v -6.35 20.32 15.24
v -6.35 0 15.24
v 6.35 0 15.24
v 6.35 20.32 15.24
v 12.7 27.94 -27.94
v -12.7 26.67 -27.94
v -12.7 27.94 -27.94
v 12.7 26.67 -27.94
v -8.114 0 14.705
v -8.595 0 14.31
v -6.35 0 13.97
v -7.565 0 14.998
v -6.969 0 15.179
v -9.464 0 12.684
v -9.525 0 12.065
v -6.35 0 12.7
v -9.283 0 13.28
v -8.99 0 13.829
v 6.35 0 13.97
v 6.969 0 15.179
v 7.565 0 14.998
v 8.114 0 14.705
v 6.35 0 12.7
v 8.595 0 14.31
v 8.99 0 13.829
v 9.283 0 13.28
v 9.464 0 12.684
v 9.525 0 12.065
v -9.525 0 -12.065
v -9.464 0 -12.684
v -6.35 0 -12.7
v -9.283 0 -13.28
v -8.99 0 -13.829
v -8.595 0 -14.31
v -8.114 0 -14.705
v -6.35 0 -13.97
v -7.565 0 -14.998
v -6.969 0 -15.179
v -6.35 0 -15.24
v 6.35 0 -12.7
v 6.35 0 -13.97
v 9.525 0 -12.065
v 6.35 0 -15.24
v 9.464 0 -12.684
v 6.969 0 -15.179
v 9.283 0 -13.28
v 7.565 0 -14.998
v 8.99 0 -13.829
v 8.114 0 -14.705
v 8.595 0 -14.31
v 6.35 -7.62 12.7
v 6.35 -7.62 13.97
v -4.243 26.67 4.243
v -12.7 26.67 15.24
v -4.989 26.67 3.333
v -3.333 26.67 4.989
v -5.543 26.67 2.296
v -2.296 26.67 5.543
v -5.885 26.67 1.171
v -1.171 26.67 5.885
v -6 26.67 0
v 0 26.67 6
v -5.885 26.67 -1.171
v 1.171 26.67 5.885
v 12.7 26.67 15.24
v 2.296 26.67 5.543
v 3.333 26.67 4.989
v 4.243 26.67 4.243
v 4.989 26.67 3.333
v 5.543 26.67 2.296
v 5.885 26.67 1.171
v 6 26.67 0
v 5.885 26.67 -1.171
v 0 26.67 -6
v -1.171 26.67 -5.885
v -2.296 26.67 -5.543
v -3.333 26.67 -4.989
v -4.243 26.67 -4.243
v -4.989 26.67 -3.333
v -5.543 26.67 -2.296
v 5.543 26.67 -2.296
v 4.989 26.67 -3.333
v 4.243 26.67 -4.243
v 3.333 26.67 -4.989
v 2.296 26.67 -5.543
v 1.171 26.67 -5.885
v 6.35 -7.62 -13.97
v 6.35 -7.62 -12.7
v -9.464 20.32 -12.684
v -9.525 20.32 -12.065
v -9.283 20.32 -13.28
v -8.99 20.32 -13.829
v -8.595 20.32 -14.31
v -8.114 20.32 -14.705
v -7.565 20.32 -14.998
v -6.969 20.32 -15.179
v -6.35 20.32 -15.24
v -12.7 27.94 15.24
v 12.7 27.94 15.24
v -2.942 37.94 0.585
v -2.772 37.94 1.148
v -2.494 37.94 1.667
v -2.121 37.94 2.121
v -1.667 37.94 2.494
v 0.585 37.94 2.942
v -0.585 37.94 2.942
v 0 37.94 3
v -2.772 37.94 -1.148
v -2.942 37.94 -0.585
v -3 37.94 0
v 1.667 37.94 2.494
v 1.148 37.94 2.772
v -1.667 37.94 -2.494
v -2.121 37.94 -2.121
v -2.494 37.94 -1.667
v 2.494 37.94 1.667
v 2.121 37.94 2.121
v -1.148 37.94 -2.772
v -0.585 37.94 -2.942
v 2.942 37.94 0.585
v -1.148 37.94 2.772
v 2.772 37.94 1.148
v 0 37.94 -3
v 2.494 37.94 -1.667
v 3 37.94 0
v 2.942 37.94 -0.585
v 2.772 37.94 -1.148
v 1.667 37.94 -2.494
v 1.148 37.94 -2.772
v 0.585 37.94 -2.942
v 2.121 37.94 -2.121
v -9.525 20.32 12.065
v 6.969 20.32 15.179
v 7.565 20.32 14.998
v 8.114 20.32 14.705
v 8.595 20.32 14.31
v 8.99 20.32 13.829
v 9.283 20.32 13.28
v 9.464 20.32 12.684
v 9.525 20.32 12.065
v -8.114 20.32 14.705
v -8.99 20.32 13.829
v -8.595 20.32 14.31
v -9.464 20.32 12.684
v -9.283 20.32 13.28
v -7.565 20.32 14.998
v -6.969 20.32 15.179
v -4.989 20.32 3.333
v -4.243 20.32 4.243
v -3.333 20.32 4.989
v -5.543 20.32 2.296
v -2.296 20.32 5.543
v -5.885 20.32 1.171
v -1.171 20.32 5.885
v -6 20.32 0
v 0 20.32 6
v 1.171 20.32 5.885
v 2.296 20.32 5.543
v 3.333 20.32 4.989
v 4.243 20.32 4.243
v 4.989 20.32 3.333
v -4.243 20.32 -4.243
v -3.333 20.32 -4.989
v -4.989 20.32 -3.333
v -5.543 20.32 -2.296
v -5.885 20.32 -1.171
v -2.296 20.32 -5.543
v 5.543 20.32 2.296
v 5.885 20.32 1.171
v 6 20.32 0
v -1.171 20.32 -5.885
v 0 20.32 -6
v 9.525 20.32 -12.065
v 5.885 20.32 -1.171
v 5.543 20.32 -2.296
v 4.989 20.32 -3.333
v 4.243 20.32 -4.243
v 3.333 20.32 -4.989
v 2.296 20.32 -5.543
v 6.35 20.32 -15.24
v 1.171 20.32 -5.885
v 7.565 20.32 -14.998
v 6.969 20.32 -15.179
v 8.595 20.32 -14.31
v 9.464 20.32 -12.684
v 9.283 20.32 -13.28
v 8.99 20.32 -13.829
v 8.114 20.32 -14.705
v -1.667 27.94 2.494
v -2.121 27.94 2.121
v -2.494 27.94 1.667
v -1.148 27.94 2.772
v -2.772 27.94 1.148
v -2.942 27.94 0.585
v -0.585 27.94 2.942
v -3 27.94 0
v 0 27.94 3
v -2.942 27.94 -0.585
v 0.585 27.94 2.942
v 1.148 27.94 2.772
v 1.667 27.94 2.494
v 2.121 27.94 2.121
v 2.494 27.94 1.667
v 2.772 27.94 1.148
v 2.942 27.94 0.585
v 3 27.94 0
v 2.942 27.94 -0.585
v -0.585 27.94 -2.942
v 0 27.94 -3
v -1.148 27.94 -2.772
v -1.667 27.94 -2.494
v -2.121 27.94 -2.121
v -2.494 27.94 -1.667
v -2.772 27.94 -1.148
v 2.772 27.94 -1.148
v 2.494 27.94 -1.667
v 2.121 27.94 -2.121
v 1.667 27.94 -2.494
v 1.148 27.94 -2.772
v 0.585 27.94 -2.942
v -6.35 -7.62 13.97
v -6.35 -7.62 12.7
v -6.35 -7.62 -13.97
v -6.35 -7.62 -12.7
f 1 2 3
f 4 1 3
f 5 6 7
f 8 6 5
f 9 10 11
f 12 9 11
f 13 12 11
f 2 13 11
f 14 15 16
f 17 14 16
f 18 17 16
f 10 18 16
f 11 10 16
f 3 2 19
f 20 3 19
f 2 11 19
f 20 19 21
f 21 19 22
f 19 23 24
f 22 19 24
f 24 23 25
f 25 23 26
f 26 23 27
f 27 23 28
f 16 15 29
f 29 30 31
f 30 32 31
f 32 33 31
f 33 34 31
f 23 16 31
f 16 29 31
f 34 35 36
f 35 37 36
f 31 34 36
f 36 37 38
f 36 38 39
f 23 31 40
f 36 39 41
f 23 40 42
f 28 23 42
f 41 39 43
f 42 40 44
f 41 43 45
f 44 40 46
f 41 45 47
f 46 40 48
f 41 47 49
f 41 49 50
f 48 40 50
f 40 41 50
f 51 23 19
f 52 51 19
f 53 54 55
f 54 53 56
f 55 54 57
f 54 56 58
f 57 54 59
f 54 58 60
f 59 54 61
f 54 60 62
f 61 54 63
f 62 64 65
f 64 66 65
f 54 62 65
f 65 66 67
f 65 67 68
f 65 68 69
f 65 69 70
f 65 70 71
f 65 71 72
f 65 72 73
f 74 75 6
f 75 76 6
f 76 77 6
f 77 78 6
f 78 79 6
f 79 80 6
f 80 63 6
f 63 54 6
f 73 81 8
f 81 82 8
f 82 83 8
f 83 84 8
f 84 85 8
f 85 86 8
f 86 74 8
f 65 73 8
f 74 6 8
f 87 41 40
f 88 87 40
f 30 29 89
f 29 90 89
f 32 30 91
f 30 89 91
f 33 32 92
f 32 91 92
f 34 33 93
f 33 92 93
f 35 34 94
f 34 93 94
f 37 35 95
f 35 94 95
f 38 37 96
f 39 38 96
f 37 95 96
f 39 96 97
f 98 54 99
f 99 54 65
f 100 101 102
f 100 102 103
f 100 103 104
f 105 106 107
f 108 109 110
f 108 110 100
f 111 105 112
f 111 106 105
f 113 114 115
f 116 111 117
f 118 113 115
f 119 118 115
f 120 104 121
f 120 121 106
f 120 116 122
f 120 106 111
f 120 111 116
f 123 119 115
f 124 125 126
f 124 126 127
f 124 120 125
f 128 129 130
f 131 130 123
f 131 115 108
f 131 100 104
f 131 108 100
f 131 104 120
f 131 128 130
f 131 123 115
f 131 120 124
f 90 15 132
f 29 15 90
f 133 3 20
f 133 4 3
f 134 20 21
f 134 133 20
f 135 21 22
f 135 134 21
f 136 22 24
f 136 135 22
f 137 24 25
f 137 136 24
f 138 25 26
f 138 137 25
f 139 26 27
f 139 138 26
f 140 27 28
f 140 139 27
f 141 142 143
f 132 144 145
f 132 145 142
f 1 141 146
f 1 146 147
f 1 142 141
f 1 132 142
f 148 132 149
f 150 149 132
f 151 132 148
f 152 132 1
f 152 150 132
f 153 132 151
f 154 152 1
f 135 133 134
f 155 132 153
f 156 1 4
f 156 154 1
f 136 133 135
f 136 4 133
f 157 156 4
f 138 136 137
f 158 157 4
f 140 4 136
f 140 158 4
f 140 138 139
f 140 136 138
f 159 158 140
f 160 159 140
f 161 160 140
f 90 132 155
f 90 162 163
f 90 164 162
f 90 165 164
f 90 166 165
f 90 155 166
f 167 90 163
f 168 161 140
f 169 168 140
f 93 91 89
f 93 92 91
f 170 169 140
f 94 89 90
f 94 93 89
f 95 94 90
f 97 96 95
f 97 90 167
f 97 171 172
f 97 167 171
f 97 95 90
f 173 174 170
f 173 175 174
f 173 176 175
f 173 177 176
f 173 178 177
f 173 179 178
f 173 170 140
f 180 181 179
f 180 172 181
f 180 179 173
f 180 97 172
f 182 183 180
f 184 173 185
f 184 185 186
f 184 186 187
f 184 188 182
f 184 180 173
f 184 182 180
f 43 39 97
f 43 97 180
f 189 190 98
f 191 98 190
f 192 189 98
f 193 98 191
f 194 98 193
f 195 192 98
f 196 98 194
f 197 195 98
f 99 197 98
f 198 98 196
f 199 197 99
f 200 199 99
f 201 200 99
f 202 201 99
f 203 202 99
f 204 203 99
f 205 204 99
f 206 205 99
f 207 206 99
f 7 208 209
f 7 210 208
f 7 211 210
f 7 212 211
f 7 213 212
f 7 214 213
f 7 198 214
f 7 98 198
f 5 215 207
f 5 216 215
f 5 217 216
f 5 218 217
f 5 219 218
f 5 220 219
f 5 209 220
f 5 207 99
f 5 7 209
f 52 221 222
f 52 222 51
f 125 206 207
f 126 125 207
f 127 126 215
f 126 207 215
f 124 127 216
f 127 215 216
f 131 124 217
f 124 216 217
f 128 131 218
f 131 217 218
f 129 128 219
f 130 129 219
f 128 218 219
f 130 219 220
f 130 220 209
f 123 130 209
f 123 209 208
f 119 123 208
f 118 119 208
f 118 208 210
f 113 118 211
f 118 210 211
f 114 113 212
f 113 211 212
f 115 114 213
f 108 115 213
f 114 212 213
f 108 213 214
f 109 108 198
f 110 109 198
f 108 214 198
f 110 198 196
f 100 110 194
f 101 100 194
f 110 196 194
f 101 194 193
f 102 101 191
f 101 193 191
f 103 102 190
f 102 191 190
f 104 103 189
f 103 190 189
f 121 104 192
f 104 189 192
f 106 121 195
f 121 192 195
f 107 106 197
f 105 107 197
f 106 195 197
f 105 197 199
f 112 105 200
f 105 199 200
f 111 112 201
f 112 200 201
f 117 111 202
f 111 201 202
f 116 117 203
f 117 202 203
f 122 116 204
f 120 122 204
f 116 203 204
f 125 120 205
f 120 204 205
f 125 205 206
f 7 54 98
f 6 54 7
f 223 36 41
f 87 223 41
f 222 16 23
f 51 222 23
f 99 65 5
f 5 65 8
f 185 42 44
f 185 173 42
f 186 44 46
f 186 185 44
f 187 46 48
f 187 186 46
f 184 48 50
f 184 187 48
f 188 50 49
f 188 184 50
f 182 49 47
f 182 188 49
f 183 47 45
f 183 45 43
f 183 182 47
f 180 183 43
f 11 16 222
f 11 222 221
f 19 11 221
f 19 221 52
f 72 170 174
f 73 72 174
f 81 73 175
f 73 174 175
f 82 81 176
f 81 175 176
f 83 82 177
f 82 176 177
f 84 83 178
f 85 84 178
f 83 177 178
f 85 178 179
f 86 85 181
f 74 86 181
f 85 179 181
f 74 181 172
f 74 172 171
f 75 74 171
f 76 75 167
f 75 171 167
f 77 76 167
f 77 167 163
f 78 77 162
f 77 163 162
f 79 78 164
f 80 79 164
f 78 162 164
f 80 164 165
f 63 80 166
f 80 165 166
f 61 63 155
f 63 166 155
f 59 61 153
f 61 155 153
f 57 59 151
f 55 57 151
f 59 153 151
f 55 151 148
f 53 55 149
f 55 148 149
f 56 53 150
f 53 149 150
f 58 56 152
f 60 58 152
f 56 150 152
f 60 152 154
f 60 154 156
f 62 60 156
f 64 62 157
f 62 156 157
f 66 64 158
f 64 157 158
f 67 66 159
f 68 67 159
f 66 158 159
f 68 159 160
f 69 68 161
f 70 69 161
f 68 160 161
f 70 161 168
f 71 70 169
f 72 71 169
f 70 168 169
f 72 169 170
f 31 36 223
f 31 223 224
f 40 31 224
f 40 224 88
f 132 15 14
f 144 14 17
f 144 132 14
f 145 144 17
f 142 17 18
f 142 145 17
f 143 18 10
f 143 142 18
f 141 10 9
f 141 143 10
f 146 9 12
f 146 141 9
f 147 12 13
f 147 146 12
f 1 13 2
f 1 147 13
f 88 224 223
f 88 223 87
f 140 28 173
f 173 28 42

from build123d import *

# Parameters (mm, degrees)
SKETCH1_W           = 19.05
SKETCH1_H           = 30.48
BOSS_EXTRUDE1_DEPTH = 20.32
FILLET1_R           = 3.175
SKETCH2_R           = 6
BOSS_EXTRUDE2_DEPTH = 6.35
SKETCH3_W           = 12.7
SKETCH3_H           = 1.27
BOSS_EXTRUDE3_DEPTH = 7.62
SKETCH4_W           = 25.4
SKETCH4_H           = 43.18
BOSS_EXTRUDE4_DEPTH = 1.27
SKETCH5_R           = 3
BOSS_EXTRUDE5_DEPTH = 10


with BuildPart() as part:
    # Sketch1 → Boss-Extrude1 (new body)
    with BuildSketch(Plane(origin=(0, 0, 0), x_dir=(1, 0, 0), z_dir=(0, 1, 0))):
        Rectangle(SKETCH1_W, SKETCH1_H)
    extrude(amount=BOSS_EXTRUDE1_DEPTH)

    # Fillet1
    fillet1_edges = [part.edges().sort_by_distance(p)[0] for p in [
        (9.525, 10.16, 15.24),
        (-9.525, 10.16, 15.24),
        (-9.525, 10.16, -15.24),
        (9.525, 10.16, -15.24),
    ]]
    fillet(fillet1_edges, radius=FILLET1_R)

    # Sketch2 → Boss-Extrude2 (add)
    with BuildSketch(Plane(origin=(0, 20.32, 0), x_dir=(1, 0, 0), z_dir=(0, 1, 0))):
        Circle(SKETCH2_R)
    extrude(amount=BOSS_EXTRUDE2_DEPTH)

    # Sketch3 → Boss-Extrude3 (add)
    with BuildSketch(Plane.XZ):
        with Locations((0, 13.335)):
            Rectangle(SKETCH3_W, SKETCH3_H)
        with Locations((0, -13.335)):
            Rectangle(SKETCH3_W, SKETCH3_H)
    extrude(amount=BOSS_EXTRUDE3_DEPTH)

    # Sketch4 → Boss-Extrude4 (add)
    with BuildSketch(Plane(origin=(0, 26.67, 0), x_dir=(1, 0, 0), z_dir=(0, 1, 0))):
        with Locations((0, 6.35)):
            Rectangle(SKETCH4_W, SKETCH4_H)
    extrude(amount=BOSS_EXTRUDE4_DEPTH)

    # Sketch5 → Boss-Extrude5 (add)
    with BuildSketch(Plane(origin=(0, 27.94, 0), x_dir=(1, 0, 0), z_dir=(0, 1, 0))):
        Circle(SKETCH5_R)
    extrude(amount=BOSS_EXTRUDE5_DEPTH)


solid = part.part
